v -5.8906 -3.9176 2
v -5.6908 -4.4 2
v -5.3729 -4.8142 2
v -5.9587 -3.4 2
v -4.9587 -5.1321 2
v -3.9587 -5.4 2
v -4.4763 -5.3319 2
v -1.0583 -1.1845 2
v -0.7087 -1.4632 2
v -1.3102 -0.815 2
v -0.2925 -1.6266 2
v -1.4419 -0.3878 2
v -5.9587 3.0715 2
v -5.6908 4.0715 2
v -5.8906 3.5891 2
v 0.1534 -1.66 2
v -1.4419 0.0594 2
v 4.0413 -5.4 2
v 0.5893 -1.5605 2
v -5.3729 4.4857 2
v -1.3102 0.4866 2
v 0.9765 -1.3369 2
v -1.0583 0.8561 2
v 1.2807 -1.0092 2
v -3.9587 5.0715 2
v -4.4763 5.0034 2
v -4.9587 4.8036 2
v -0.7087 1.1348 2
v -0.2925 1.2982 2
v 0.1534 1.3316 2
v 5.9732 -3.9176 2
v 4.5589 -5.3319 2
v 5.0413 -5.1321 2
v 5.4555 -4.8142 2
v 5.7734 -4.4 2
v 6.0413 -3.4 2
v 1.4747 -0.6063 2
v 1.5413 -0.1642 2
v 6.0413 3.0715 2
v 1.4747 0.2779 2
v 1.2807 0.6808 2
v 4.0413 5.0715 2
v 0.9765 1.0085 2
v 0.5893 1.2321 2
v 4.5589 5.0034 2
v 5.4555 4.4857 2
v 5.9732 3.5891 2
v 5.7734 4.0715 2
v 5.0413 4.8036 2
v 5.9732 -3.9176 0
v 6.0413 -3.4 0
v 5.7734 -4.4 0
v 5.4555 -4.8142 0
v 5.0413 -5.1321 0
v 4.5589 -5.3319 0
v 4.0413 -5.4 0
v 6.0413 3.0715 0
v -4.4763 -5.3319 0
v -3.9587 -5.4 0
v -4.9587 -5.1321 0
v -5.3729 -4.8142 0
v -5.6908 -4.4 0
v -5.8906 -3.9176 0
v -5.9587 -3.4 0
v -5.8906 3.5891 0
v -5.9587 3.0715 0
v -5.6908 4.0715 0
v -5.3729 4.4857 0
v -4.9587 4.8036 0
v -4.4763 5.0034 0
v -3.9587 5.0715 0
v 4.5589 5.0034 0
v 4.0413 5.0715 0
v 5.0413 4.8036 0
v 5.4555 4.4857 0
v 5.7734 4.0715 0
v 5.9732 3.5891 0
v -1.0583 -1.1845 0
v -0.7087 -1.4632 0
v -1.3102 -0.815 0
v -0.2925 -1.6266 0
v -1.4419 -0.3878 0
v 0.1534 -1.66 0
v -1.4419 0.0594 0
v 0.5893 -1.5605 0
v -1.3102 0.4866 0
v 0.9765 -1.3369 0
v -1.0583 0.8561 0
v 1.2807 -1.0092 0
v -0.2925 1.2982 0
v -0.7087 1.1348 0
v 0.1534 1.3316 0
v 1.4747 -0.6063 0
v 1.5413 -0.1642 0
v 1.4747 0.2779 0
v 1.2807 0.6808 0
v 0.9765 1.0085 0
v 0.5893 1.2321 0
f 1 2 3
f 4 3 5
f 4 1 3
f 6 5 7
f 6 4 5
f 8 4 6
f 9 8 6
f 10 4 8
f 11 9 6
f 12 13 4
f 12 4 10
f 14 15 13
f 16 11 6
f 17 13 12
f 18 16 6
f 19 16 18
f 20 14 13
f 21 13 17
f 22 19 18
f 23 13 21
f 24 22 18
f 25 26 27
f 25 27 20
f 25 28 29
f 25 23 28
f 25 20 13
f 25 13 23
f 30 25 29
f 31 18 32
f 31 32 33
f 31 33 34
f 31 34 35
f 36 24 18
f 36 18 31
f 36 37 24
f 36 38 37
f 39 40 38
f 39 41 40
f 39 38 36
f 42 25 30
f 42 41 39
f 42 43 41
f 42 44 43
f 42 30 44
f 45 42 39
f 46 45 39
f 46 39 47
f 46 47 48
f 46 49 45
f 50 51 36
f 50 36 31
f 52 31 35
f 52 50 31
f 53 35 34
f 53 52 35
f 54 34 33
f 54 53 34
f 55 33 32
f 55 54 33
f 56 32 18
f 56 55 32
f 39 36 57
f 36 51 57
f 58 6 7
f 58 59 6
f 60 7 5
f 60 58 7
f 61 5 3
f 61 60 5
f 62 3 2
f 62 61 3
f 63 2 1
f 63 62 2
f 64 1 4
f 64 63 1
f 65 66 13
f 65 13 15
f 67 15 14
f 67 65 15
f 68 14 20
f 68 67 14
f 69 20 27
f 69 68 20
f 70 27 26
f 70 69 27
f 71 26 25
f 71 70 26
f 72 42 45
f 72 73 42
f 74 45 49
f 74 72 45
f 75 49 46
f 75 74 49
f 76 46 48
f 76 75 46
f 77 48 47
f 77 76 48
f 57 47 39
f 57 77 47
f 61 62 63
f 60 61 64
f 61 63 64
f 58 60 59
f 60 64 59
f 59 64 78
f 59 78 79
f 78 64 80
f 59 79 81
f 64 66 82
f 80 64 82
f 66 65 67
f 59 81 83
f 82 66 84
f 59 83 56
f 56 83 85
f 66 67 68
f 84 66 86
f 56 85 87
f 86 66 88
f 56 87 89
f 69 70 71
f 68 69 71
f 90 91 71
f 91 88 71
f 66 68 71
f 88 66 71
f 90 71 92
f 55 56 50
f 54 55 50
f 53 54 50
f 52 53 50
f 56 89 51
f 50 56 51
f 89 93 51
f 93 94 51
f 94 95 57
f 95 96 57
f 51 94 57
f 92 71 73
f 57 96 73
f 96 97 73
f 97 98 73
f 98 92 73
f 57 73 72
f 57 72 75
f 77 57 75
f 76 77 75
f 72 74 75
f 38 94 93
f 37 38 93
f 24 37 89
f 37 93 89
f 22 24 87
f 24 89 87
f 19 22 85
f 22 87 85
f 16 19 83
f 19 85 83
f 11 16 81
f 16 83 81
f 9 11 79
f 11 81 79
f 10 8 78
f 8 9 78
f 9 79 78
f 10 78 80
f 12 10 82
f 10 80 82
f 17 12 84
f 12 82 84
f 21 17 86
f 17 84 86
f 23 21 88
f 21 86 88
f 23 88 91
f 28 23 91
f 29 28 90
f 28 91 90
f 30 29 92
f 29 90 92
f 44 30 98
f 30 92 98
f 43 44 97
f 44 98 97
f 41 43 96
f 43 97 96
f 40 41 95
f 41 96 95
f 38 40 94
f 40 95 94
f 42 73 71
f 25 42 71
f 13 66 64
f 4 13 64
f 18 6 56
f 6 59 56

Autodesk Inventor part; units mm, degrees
ref_plane "YZ Plane" through (0, 0, 0) normal (1, 0, 0) x (0, 1, 0)
ref_plane "XZ Plane" through (0, 0, 0) normal (0, 1, 0) x (-1, 0, 0)
ref_plane "XY Plane" through (0, 0, 0) normal (0, 0, 1) x (1, 0, 0)
sketch "washer_sketch" plane through (0, 0, 0) normal (0, 0, 1) x (1, 0, 0)
  line L0 (4.6466, -2.6825) -> (1.9799, -4.6825) construction
  arc A0 (4.6466, -2.6825) -> (5.4466, -1.0825) centre (3.4466, -1.0825) ccw construction
  line L1 (5.4466, 5.0715) -> (5.4466, -1.0825) construction
  line L2 (5.4466, 5.0825) -> (5.4466, 5.0715) construction
  line L3 (-5.4466, 5.0825) -> (5.4466, 5.0825) construction
  line L4 (-5.4466, 0.6191) -> (-5.4466, 5.0825) construction
  arc A1 (-5.4466, 0.6191) -> (-5.0083, -0.6303) centre (-3.4466, 0.6191) ccw construction
  line L5 (-2.0471, -4.3319) -> (-5.0083, -0.6303) construction
  arc A2 (-2.0471, -4.3319) -> (-0.4853, -5.0825) centre (-0.4853, -3.0825) ccw construction
  line L6 (0.7799, -5.0825) -> (-0.4853, -5.0825) construction
  arc A3 (0.7799, -5.0825) -> (1.9799, -4.6825) centre (0.7799, -3.0825) ccw construction
  circle A4 centre (0.0413, -0.1642) radius 3.55 construction
  circle A5 centre (0.0413, -0.1642) radius 3.55 construction
  circle A6 centre (0.0413, -0.1642) radius 1.5 projected
  line L7 (-3.9587, -5.4) -> (4.0413, -5.4)
  line L8 (6.0413, -3.4) -> (6.0413, 3.0715)
  line L9 (4.0413, 5.0715) -> (-3.9587, 5.0715)
  line L10 (-5.9587, 3.0715) -> (-5.9587, -3.4)
  arc A7 (-5.9587, -3.4) -> (-3.9587, -5.4) centre (-3.9587, -3.4) ccw
  arc A8 (-3.9587, 5.0715) -> (-5.9587, 3.0715) centre (-3.9587, 3.0715) ccw
  arc A9 (6.0413, 3.0715) -> (4.0413, 5.0715) centre (4.0413, 3.0715) ccw
  arc A10 (4.0413, -5.4) -> (6.0413, -3.4) centre (4.0413, -3.4) ccw
  point P0 (0, 0)
  point P1 (-5.9587, -5.4)
  point P2 (6.0413, 5.0715)
  point P3 (6.0413, -5.4)
  point P4 (-5.9587, 5.0715)
  dimension "d0" = 10.4715
  dimension "d1" = 12
  dimension "d2" = 5.2358
  dimension "d3" = 6
  dimension "d4" = 2
extrude "washer" add sketch "washer_sketch" along normal blind 2
equation "\"d0\" = 2 * d2"
equation "\"d3\" = 0.5 * d1"
properties part number "mount_linear_stepper_washer_c"
